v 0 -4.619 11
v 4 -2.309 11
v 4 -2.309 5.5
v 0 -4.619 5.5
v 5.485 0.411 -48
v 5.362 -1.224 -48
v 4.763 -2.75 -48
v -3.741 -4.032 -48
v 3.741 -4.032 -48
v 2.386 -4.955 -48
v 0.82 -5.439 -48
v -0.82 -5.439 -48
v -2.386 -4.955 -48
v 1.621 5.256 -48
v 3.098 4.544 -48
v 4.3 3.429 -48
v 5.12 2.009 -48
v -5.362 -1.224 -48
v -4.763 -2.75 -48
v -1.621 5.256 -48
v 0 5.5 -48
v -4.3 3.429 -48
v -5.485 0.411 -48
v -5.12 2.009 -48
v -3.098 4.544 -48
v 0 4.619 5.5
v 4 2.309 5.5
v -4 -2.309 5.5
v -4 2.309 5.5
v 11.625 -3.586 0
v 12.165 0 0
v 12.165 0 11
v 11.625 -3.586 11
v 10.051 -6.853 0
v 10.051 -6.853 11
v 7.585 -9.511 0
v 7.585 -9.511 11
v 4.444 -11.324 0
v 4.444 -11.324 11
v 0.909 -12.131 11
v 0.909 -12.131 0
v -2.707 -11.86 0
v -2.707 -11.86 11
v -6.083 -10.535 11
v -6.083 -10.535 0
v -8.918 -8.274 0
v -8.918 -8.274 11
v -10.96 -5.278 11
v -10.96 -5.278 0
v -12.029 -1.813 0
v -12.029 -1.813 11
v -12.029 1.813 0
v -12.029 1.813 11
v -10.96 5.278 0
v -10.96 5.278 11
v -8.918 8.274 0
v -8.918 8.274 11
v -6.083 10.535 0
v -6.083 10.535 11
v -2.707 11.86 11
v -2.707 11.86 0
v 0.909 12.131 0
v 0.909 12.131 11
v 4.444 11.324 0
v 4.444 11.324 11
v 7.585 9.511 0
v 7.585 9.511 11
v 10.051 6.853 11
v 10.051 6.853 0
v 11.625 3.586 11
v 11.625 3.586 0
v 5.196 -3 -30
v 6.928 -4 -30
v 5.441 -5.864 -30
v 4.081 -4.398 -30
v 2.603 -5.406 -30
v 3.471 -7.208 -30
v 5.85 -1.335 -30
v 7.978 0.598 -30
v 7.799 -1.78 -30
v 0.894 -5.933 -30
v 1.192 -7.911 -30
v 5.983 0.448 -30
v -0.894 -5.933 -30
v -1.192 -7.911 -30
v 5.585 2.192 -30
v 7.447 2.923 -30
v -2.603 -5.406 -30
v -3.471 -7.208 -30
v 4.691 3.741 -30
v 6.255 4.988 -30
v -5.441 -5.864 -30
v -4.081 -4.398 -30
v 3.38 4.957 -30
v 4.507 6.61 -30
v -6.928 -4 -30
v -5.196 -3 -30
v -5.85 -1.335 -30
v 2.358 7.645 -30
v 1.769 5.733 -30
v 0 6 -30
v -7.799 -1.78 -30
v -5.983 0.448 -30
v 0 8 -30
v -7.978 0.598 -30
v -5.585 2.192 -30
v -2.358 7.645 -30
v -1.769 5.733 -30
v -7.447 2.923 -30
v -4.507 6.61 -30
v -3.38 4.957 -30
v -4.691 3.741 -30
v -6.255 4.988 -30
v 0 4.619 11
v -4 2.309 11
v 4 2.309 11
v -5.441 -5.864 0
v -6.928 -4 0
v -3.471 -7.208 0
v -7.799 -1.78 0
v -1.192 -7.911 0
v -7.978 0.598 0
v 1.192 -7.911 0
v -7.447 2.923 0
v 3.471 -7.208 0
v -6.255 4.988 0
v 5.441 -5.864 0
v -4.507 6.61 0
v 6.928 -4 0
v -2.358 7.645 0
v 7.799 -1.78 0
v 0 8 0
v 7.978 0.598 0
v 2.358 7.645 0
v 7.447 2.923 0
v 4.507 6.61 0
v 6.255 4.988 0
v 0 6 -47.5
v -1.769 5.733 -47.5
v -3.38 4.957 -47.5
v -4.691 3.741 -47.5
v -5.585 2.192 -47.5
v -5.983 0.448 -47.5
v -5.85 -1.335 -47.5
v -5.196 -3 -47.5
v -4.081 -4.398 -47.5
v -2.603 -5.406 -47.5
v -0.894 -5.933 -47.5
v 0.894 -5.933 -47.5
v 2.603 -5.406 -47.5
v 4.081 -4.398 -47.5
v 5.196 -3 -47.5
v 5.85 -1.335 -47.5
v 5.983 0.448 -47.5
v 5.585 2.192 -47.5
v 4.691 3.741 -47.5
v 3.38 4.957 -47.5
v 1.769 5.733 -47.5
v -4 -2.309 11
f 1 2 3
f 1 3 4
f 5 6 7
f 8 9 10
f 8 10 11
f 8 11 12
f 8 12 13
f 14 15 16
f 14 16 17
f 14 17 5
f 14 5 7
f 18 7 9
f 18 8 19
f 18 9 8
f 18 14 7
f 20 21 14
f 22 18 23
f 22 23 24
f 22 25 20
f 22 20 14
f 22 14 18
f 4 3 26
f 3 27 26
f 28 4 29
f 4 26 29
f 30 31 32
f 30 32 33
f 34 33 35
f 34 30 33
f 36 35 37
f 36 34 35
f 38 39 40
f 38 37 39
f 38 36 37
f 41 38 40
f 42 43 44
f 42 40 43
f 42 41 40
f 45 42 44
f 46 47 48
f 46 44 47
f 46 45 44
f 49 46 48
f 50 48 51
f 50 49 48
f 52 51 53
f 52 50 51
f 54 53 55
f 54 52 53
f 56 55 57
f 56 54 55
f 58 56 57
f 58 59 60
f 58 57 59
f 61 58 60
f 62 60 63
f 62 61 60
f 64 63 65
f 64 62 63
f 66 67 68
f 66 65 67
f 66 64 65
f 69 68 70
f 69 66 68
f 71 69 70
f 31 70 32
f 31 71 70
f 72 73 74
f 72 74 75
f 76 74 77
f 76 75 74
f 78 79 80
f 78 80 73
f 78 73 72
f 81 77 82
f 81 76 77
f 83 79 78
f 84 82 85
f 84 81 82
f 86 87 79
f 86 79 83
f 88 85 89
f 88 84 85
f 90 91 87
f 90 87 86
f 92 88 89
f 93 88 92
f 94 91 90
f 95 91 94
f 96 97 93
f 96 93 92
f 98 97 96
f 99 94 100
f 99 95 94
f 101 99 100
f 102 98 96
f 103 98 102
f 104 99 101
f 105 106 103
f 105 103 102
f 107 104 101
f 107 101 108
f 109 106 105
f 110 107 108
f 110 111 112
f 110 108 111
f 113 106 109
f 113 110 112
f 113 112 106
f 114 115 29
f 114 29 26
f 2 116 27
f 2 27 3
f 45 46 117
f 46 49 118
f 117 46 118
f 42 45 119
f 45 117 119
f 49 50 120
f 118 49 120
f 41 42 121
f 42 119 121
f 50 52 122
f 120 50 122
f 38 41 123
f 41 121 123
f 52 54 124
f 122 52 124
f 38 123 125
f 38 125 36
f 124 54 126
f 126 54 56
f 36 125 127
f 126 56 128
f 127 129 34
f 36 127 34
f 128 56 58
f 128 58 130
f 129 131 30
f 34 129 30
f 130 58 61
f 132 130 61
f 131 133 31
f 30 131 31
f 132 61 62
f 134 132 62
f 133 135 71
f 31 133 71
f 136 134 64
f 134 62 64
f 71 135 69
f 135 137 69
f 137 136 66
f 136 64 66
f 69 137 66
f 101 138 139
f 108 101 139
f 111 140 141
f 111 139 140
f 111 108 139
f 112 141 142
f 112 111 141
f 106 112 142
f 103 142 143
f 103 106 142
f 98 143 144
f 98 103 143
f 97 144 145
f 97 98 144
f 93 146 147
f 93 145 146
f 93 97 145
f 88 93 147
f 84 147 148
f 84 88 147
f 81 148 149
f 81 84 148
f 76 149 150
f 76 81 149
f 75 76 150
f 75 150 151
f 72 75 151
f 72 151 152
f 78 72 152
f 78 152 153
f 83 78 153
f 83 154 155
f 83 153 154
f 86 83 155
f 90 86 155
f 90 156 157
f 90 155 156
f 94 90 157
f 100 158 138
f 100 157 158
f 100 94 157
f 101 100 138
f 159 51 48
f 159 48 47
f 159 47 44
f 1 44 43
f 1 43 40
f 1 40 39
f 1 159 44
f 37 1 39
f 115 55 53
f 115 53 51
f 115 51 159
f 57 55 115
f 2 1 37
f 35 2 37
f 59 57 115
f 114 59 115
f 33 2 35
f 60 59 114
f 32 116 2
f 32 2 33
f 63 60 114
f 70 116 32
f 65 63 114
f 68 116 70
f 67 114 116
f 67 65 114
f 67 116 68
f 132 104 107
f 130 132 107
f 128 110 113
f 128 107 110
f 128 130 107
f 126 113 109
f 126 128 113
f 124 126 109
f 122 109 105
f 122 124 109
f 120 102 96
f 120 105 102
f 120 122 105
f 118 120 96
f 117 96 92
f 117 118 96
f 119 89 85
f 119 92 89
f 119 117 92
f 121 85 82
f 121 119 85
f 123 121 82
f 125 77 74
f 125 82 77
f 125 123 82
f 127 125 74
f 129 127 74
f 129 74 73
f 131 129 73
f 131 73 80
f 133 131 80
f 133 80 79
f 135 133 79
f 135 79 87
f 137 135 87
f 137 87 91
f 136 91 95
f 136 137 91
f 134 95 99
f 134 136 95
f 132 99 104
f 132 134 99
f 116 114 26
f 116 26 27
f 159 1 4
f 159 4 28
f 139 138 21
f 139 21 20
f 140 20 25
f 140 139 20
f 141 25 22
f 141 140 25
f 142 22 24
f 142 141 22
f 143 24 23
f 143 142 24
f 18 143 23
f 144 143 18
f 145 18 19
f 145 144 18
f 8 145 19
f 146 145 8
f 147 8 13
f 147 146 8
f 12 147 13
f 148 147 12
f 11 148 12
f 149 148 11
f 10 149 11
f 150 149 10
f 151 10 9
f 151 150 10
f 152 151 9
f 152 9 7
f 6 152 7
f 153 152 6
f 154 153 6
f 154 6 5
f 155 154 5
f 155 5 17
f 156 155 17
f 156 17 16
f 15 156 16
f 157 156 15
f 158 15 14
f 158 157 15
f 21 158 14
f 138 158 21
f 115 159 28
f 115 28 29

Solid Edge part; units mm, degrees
sketch "Sketch1" plane through (0, 0, 0) normal (0, 0, 1) x (1, 0, 0)
  circle A0 centre (0, 0) radius 12.165
  dimension "D1" = 24.33
extrude "Protrusion1" add sketch "Sketch1" along normal blind 11
sketch "Sketch2" plane through (0, 0, 11) normal (0, 0, 1) x (1, 0, 0)
  line L0 (0, -4.6188) -> (-4, -2.3094)
  line L1 (-4, -2.3094) -> (-4, 2.3094)
  line L2 (-4, 2.3094) -> (0, 4.6188)
  line L3 (0, 4.6188) -> (4, 2.3094)
  line L4 (4, 2.3094) -> (4, -2.3094)
  line L5 (4, -2.3094) -> (0, -4.6188)
  dimension "D1" = 8
extrude "Cutout1" cut sketch "Sketch2" against normal blind 5.5
sketch "Sketch3" plane through (0, 0, 0) normal (0, 0, -1) x (0, 1, 0)
  circle A0 centre (0, 0) radius 8
  dimension "D1" = 16
extrude "Protrusion2" add sketch "Sketch3" along normal blind 30
sketch "Sketch4" plane through (0, 0, -30) normal (0, 0, -1) x (0, 1, 0)
  circle A0 centre (0, 0) radius 6
  dimension "D1" = 12
extrude "Protrusion3" add sketch "Sketch4" along normal blind 18
chamfer "Chamfer1" distance 0.5 angle 45 1 edges at (0, -6, -48)
properties part number "108084"
